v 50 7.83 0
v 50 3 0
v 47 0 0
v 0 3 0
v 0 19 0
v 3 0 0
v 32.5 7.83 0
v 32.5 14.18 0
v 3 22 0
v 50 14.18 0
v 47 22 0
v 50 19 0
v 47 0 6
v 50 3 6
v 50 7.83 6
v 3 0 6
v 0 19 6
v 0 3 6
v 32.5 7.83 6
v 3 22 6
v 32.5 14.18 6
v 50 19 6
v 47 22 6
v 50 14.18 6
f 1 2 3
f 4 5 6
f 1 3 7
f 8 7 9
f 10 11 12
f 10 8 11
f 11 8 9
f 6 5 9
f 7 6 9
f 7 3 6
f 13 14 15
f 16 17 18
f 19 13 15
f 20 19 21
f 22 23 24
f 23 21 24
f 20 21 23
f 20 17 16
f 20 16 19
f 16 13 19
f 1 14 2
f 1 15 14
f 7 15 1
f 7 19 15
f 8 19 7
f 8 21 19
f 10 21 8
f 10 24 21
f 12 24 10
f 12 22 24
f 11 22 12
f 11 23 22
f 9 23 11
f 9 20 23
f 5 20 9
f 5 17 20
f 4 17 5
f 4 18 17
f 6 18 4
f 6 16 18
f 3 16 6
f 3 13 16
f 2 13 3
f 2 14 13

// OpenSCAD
$fn = 32;

// ----------------------------------------------------------------------
// C washer: 50 x 22 mm plate with an open slot
// ----------------------------------------------------------------------

// --- parameters (mm) ---
profile_height = 6;       // extrusion height
profile_points = 12;      // points of the closed outline

profile = [[3, 0], [47, 0], [50, 3], [50, 7.83], [32.5, 7.83], [32.5, 14.18], [50, 14.18], [50, 19], [47, 22], [3, 22], [0, 19], [0, 3]];  // single closed polygon, 12 points, counter clockwise

// --- the one profile operation ---
linear_extrude(height = profile_height) polygon(points = profile);
